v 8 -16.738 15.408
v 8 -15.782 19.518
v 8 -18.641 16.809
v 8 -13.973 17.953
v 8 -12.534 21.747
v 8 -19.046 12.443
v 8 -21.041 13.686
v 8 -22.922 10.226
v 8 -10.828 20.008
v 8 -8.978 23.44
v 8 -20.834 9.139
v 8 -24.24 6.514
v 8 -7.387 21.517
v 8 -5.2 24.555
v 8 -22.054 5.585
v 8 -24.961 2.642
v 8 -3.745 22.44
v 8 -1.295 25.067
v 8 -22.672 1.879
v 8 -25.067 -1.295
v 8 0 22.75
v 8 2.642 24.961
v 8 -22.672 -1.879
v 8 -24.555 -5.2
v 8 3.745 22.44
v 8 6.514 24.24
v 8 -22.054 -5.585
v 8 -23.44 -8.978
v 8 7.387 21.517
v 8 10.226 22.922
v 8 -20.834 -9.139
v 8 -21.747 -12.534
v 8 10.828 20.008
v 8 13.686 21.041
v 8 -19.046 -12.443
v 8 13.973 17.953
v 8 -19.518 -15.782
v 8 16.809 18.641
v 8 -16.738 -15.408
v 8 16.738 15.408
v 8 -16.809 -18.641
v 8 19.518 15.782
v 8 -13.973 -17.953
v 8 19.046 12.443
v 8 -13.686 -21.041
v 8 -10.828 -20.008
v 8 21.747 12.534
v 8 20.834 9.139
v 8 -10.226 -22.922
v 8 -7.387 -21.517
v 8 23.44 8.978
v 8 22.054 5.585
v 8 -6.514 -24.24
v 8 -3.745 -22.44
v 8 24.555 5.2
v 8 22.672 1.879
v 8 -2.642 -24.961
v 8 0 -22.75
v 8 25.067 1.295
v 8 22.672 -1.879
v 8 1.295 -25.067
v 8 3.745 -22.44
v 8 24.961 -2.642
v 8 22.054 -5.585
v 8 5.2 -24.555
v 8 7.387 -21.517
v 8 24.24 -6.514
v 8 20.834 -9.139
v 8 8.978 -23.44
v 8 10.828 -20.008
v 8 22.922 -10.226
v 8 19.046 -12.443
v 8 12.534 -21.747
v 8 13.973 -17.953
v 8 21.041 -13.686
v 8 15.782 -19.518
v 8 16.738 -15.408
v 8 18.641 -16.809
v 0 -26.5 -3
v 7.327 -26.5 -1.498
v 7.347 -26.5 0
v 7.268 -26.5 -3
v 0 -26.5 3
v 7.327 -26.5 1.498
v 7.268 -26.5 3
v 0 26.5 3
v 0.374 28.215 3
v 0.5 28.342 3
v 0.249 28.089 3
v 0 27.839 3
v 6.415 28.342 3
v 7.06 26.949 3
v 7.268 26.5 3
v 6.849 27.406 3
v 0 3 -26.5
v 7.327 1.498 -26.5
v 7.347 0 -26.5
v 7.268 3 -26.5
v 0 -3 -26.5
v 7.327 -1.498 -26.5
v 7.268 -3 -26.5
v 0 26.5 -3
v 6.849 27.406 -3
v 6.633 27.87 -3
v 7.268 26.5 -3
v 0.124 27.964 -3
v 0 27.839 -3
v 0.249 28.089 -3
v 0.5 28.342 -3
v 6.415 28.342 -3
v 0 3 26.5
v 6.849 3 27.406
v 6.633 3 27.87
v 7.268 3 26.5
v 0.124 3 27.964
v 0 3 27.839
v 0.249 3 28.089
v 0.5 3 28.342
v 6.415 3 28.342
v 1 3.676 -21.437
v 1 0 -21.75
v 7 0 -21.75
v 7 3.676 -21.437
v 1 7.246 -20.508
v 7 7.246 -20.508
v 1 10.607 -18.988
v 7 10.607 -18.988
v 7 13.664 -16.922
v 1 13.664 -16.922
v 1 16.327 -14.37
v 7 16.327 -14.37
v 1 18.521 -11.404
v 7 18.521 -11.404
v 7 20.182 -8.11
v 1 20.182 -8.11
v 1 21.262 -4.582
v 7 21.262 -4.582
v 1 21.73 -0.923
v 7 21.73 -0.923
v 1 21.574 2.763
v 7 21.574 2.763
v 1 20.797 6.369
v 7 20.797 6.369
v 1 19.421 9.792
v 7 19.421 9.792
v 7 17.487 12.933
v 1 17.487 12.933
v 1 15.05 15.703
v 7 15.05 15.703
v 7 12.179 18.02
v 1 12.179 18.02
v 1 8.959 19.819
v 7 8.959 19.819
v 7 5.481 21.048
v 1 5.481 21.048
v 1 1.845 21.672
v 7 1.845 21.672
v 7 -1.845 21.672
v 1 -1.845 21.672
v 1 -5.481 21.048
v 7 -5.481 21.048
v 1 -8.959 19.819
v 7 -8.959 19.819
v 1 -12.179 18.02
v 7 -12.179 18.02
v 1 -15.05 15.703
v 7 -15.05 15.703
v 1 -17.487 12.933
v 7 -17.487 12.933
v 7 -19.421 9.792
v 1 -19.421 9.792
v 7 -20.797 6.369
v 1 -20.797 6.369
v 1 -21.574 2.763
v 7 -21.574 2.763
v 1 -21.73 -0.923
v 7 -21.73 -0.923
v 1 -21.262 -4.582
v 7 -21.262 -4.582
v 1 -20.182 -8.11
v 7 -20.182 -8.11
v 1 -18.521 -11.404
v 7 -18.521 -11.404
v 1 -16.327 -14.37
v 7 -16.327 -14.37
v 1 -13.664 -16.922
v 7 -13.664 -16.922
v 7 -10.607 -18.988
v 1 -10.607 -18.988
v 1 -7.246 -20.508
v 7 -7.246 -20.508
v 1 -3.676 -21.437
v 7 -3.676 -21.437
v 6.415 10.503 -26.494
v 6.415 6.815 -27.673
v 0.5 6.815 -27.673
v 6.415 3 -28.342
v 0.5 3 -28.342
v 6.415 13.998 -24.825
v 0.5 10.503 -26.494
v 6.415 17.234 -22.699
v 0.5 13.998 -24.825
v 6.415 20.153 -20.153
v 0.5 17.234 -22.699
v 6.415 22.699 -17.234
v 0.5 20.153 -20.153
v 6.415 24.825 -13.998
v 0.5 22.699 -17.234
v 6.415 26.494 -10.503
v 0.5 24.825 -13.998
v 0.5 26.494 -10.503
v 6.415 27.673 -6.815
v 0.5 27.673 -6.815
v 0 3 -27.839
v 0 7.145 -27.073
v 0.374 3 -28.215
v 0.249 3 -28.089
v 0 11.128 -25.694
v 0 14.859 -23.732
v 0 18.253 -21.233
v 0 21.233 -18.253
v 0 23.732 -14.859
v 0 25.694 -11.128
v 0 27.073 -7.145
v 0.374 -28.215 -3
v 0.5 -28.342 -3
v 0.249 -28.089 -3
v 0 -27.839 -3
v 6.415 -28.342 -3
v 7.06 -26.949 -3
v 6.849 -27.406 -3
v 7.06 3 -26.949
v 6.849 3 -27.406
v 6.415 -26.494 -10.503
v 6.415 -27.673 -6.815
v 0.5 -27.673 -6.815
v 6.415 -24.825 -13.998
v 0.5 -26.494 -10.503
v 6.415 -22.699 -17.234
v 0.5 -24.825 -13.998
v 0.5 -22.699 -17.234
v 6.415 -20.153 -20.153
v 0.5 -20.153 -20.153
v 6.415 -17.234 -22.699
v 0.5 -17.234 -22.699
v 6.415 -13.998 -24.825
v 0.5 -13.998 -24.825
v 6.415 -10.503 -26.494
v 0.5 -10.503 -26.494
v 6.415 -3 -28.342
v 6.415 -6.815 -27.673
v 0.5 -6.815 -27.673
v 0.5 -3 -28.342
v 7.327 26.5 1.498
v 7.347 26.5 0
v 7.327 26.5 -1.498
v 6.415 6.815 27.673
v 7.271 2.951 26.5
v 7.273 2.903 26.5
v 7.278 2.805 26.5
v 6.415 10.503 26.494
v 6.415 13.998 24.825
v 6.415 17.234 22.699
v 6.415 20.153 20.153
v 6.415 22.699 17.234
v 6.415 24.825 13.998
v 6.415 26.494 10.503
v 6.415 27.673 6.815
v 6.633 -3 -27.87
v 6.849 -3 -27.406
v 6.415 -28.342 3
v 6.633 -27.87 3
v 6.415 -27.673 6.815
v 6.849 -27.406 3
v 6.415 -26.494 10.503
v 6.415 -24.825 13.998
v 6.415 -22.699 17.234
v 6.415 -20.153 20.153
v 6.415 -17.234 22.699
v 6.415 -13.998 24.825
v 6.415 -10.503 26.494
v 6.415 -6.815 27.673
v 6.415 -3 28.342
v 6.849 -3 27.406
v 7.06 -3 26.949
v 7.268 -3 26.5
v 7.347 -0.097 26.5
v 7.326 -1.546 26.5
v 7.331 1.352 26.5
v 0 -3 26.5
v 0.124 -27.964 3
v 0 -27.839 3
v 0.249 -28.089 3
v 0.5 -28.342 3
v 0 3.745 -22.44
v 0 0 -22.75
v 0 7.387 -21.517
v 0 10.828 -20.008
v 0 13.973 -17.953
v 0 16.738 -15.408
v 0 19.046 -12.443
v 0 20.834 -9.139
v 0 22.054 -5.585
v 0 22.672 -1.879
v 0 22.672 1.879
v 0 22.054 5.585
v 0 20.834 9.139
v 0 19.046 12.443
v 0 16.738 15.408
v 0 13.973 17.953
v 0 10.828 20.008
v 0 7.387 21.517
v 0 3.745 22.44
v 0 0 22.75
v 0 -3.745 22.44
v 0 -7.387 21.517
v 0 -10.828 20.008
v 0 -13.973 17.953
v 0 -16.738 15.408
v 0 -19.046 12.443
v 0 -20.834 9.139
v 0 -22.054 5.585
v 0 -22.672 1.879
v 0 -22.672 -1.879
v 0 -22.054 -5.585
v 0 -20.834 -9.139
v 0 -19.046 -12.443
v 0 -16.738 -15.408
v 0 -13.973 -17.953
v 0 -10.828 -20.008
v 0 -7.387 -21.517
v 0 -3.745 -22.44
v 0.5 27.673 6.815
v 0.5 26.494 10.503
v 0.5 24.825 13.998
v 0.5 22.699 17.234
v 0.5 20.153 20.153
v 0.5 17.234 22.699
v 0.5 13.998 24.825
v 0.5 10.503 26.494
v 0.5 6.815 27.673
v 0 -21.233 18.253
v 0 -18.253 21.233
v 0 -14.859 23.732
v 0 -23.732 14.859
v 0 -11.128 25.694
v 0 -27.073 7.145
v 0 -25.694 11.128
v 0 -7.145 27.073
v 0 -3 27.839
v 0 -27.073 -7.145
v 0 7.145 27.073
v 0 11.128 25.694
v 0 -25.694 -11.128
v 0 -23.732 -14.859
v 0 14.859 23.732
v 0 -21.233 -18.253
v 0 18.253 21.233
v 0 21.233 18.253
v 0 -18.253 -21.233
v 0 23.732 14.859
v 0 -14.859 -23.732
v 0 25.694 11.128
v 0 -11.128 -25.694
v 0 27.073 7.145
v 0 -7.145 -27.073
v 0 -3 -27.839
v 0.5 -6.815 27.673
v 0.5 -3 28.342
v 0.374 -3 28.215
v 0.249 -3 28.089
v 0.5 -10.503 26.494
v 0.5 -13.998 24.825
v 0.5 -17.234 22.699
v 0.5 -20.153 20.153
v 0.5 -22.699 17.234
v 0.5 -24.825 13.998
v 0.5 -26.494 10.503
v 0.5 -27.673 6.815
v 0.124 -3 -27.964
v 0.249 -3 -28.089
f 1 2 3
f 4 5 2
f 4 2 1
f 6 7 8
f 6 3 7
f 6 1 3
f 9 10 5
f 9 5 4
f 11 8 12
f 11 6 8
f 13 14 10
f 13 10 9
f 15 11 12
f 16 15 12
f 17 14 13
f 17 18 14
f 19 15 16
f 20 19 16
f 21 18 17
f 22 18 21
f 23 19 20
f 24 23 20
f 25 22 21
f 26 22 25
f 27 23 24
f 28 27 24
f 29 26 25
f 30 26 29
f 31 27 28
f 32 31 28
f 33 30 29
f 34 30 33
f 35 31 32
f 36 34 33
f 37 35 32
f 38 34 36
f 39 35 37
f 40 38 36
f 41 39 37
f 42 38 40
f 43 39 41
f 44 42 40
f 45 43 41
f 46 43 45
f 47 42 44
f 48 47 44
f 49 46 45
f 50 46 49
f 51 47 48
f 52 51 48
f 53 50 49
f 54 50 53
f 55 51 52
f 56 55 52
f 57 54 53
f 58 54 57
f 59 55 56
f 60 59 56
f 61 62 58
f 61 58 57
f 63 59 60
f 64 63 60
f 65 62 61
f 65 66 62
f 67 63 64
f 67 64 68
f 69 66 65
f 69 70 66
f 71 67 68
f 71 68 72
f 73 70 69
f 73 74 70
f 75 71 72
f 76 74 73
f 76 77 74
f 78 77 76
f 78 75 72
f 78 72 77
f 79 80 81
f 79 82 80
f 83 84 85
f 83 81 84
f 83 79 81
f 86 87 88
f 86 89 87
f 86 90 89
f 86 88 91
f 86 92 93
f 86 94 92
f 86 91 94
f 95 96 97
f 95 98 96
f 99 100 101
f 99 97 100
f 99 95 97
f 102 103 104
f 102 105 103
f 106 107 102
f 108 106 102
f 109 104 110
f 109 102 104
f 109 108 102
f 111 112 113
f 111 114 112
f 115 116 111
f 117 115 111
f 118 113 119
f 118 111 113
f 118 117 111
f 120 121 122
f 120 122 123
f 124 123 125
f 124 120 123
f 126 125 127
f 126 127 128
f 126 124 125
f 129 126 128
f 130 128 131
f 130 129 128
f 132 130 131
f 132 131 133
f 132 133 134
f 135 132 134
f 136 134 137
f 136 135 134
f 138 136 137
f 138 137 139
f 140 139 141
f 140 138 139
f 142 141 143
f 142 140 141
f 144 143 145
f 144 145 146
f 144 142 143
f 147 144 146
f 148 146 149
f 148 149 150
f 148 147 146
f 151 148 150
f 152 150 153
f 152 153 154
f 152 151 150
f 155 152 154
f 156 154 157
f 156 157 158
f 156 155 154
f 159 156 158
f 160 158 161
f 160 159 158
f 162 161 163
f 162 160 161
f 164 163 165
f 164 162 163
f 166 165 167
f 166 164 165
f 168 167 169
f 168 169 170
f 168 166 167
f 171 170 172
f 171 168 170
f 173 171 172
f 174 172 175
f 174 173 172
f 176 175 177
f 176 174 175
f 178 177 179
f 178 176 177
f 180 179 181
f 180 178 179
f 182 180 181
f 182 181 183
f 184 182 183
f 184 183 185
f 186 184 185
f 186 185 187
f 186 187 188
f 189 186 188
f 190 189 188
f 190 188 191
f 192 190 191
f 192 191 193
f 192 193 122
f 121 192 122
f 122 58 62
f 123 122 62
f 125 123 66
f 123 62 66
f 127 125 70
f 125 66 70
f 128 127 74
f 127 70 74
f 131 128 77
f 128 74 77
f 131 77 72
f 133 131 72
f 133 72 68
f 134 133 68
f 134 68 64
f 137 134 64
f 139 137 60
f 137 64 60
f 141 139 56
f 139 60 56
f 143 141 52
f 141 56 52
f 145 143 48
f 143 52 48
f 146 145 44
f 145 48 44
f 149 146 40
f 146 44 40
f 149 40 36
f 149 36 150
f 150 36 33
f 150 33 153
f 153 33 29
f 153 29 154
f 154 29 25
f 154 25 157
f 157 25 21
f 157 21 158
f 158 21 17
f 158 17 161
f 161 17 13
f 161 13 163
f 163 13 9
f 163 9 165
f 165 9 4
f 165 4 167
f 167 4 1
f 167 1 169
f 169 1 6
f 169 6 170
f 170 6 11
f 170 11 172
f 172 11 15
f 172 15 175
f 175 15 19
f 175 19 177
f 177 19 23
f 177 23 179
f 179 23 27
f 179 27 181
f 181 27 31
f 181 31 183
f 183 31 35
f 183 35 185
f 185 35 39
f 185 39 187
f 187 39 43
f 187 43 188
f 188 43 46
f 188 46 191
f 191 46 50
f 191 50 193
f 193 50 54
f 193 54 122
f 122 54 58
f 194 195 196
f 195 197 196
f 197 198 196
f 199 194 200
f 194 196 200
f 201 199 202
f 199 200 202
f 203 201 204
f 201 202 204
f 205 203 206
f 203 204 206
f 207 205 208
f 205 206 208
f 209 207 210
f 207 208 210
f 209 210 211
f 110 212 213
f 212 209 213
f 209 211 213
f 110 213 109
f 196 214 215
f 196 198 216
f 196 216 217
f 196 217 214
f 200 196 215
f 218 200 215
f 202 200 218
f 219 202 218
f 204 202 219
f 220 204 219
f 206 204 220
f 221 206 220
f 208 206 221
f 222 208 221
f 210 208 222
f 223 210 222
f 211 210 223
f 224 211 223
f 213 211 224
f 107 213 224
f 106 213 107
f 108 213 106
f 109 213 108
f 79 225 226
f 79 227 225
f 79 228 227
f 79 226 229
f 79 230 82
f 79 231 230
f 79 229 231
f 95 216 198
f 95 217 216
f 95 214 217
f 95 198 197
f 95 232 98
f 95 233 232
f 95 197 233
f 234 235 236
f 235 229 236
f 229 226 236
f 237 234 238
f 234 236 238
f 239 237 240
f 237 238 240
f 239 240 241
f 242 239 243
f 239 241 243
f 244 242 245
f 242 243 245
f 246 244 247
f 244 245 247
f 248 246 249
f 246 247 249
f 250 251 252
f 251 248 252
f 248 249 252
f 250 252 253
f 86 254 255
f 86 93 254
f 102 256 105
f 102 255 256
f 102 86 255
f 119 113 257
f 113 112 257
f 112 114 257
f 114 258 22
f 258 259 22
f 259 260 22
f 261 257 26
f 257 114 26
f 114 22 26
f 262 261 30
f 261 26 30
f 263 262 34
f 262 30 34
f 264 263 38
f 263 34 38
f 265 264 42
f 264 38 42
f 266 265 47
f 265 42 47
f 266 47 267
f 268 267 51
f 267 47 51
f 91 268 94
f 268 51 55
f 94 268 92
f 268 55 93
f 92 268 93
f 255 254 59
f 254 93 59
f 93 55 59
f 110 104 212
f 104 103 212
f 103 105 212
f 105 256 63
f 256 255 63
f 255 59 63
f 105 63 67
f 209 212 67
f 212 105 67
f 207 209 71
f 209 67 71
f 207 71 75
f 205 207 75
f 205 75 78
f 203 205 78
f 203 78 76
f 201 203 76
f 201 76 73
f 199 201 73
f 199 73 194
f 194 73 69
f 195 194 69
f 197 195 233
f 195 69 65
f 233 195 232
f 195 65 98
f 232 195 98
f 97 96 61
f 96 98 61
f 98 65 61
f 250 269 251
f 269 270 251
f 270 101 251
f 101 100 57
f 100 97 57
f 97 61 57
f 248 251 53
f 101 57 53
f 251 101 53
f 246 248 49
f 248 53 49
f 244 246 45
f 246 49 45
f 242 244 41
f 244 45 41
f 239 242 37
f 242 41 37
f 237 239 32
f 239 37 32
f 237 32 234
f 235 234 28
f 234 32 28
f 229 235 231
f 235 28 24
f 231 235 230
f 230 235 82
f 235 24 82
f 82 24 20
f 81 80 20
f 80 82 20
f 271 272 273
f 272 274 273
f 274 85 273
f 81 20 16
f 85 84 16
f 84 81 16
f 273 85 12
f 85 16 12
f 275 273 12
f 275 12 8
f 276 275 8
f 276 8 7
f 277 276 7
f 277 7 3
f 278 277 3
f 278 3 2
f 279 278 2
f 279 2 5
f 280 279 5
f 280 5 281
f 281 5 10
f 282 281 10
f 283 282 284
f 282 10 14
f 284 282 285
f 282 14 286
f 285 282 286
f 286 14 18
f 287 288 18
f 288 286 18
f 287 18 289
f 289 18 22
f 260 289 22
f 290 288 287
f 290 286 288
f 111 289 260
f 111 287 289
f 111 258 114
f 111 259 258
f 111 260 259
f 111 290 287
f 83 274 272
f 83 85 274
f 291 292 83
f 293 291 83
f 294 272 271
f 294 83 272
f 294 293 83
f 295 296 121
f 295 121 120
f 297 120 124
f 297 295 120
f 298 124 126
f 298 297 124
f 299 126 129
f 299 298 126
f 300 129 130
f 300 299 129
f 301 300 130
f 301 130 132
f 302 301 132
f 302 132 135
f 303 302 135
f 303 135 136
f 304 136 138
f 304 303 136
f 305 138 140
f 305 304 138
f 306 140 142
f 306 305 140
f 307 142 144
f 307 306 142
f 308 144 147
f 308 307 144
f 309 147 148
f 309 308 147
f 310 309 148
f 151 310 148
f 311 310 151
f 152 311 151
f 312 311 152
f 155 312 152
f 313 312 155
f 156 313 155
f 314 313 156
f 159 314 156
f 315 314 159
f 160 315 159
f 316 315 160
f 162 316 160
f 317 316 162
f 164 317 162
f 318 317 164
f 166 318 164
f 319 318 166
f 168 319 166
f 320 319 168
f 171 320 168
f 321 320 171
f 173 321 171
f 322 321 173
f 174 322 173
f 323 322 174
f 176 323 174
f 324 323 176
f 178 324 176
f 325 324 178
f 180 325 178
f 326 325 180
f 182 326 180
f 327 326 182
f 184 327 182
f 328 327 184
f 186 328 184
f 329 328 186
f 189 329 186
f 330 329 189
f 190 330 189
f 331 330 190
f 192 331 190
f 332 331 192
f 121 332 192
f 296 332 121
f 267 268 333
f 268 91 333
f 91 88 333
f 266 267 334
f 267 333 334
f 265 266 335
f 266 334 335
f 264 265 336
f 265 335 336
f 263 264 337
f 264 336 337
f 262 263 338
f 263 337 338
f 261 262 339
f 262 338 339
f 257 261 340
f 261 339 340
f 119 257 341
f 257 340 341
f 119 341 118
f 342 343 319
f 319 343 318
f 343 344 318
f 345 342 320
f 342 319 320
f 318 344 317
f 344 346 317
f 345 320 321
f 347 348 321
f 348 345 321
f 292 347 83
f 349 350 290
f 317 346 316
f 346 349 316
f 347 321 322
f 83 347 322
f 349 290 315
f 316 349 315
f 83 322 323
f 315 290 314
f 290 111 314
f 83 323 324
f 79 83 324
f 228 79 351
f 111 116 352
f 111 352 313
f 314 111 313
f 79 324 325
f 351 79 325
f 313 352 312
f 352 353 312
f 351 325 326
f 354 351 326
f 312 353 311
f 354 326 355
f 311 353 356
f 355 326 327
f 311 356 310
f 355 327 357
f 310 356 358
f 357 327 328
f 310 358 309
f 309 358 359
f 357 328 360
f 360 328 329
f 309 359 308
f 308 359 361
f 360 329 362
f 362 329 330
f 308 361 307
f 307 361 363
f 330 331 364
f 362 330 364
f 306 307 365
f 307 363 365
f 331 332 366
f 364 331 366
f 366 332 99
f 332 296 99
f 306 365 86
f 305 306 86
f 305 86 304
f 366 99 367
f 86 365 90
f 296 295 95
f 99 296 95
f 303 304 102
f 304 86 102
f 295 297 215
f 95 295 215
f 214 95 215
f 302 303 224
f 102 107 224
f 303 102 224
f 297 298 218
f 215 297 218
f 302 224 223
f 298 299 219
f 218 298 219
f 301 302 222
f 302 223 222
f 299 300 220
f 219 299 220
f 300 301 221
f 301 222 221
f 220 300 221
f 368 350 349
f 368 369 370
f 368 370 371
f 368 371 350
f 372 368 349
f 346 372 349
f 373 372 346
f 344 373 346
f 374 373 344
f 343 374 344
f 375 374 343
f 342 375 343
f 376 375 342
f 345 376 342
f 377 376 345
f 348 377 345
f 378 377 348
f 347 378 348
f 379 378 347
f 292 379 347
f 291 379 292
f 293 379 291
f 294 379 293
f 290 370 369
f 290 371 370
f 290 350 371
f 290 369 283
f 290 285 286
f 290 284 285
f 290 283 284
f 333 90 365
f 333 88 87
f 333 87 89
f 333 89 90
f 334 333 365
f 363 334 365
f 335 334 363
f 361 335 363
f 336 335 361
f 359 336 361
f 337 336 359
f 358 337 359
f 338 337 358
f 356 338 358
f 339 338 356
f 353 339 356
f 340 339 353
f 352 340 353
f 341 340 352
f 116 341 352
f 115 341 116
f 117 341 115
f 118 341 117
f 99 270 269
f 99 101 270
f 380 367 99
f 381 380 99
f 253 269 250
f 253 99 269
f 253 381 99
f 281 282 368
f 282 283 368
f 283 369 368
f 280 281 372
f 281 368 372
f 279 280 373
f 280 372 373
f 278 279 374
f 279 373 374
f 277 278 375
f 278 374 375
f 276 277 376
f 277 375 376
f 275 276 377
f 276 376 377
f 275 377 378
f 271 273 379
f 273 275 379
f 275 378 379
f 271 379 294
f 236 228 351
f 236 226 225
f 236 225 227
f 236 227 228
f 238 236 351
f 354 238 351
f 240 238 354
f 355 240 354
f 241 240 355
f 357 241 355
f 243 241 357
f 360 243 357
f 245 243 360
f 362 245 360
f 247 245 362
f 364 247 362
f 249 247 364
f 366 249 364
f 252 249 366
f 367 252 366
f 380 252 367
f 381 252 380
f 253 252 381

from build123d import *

# Parameters (mm, degrees)
SKETCH_1_R               = 28.5
SKETCH_1_R_2             = 21.75
EXTRUDE_1_DEPTH          = 8
CHAMFER_1_SIZE           = 1
CHAMFER_2_SIZE           = 0.5
CUT_EXTRUDE_START        = -8
CUT_EXTRUDE_1_DEPTH      = 8
PATTERN_CIRCULAR_1_COUNT = 4


with BuildPart() as part:
    # 草图1 → 凸台-拉伸1 (new body)
    with BuildSketch(Plane(origin=(0, 0, 0), x_dir=(0, 0, -1), z_dir=(1, 0, 0))):
        Circle(SKETCH_1_R)
        Circle(SKETCH_1_R_2, mode=Mode.SUBTRACT)
    extrude(amount=EXTRUDE_1_DEPTH)

    # 倒角1
    chamfer_1_edges = [part.edges().sort_by_distance(p)[0] for p in [
        (0, 0, 21.75),
        (8, 0, 21.75),
    ]]
    chamfer(chamfer_1_edges, length=CHAMFER_1_SIZE)

    # 倒角2
    chamfer_2_edges = [part.edges().sort_by_distance(p)[0] for p in [
        (0, 0, 28.5),
    ]]
    chamfer(chamfer_2_edges, length=CHAMFER_2_SIZE)

    # 草图2 → 切除-拉伸1 (cut)
    with BuildSketch(Plane(origin=(8, 0, 0), x_dir=(0, 0, -1), z_dir=(1, 0, 0)).offset(CUT_EXTRUDE_START)):
        with BuildLine():
            Line((-3, 28.341665442), (-3, 26.5))
            Line((-3, 26.5), (3, 26.5))
            Line((3, 26.5), (3, 28.341665442))
            ThreePointArc((3, 28.341665442), (0, 28.5), (-3, 28.341665442))
        make_face()
    cut_extrude_1 = extrude(amount=CUT_EXTRUDE_1_DEPTH, mode=Mode.SUBTRACT)

    # 阵列(圆周)1: 切除-拉伸1 ×4 about axis
    pattern_circular_1_axis = Axis((0, 0, 0), (1, 0, 0))
    for i in range(1, PATTERN_CIRCULAR_1_COUNT):
        add(cut_extrude_1.rotate(pattern_circular_1_axis, i * 360 / PATTERN_CIRCULAR_1_COUNT), mode=Mode.SUBTRACT)

    # 草图3 → 切除-旋转1 (revolve, cut)
    with BuildSketch(Plane.XY, mode=Mode.PRIVATE) as cut_revolve_1_sk:
        Polygon((3.295131606, 35.18962283), (8, 25.1), (8, 35.18962283), align=None)
    revolve(cut_revolve_1_sk.sketch.rotate(Axis((8, 0, 0), (-1, 0, 0)), 276.042328419), axis=Axis((8, 0, 0), (-1, 0, 0)), mode=Mode.SUBTRACT)


solid = part.part
